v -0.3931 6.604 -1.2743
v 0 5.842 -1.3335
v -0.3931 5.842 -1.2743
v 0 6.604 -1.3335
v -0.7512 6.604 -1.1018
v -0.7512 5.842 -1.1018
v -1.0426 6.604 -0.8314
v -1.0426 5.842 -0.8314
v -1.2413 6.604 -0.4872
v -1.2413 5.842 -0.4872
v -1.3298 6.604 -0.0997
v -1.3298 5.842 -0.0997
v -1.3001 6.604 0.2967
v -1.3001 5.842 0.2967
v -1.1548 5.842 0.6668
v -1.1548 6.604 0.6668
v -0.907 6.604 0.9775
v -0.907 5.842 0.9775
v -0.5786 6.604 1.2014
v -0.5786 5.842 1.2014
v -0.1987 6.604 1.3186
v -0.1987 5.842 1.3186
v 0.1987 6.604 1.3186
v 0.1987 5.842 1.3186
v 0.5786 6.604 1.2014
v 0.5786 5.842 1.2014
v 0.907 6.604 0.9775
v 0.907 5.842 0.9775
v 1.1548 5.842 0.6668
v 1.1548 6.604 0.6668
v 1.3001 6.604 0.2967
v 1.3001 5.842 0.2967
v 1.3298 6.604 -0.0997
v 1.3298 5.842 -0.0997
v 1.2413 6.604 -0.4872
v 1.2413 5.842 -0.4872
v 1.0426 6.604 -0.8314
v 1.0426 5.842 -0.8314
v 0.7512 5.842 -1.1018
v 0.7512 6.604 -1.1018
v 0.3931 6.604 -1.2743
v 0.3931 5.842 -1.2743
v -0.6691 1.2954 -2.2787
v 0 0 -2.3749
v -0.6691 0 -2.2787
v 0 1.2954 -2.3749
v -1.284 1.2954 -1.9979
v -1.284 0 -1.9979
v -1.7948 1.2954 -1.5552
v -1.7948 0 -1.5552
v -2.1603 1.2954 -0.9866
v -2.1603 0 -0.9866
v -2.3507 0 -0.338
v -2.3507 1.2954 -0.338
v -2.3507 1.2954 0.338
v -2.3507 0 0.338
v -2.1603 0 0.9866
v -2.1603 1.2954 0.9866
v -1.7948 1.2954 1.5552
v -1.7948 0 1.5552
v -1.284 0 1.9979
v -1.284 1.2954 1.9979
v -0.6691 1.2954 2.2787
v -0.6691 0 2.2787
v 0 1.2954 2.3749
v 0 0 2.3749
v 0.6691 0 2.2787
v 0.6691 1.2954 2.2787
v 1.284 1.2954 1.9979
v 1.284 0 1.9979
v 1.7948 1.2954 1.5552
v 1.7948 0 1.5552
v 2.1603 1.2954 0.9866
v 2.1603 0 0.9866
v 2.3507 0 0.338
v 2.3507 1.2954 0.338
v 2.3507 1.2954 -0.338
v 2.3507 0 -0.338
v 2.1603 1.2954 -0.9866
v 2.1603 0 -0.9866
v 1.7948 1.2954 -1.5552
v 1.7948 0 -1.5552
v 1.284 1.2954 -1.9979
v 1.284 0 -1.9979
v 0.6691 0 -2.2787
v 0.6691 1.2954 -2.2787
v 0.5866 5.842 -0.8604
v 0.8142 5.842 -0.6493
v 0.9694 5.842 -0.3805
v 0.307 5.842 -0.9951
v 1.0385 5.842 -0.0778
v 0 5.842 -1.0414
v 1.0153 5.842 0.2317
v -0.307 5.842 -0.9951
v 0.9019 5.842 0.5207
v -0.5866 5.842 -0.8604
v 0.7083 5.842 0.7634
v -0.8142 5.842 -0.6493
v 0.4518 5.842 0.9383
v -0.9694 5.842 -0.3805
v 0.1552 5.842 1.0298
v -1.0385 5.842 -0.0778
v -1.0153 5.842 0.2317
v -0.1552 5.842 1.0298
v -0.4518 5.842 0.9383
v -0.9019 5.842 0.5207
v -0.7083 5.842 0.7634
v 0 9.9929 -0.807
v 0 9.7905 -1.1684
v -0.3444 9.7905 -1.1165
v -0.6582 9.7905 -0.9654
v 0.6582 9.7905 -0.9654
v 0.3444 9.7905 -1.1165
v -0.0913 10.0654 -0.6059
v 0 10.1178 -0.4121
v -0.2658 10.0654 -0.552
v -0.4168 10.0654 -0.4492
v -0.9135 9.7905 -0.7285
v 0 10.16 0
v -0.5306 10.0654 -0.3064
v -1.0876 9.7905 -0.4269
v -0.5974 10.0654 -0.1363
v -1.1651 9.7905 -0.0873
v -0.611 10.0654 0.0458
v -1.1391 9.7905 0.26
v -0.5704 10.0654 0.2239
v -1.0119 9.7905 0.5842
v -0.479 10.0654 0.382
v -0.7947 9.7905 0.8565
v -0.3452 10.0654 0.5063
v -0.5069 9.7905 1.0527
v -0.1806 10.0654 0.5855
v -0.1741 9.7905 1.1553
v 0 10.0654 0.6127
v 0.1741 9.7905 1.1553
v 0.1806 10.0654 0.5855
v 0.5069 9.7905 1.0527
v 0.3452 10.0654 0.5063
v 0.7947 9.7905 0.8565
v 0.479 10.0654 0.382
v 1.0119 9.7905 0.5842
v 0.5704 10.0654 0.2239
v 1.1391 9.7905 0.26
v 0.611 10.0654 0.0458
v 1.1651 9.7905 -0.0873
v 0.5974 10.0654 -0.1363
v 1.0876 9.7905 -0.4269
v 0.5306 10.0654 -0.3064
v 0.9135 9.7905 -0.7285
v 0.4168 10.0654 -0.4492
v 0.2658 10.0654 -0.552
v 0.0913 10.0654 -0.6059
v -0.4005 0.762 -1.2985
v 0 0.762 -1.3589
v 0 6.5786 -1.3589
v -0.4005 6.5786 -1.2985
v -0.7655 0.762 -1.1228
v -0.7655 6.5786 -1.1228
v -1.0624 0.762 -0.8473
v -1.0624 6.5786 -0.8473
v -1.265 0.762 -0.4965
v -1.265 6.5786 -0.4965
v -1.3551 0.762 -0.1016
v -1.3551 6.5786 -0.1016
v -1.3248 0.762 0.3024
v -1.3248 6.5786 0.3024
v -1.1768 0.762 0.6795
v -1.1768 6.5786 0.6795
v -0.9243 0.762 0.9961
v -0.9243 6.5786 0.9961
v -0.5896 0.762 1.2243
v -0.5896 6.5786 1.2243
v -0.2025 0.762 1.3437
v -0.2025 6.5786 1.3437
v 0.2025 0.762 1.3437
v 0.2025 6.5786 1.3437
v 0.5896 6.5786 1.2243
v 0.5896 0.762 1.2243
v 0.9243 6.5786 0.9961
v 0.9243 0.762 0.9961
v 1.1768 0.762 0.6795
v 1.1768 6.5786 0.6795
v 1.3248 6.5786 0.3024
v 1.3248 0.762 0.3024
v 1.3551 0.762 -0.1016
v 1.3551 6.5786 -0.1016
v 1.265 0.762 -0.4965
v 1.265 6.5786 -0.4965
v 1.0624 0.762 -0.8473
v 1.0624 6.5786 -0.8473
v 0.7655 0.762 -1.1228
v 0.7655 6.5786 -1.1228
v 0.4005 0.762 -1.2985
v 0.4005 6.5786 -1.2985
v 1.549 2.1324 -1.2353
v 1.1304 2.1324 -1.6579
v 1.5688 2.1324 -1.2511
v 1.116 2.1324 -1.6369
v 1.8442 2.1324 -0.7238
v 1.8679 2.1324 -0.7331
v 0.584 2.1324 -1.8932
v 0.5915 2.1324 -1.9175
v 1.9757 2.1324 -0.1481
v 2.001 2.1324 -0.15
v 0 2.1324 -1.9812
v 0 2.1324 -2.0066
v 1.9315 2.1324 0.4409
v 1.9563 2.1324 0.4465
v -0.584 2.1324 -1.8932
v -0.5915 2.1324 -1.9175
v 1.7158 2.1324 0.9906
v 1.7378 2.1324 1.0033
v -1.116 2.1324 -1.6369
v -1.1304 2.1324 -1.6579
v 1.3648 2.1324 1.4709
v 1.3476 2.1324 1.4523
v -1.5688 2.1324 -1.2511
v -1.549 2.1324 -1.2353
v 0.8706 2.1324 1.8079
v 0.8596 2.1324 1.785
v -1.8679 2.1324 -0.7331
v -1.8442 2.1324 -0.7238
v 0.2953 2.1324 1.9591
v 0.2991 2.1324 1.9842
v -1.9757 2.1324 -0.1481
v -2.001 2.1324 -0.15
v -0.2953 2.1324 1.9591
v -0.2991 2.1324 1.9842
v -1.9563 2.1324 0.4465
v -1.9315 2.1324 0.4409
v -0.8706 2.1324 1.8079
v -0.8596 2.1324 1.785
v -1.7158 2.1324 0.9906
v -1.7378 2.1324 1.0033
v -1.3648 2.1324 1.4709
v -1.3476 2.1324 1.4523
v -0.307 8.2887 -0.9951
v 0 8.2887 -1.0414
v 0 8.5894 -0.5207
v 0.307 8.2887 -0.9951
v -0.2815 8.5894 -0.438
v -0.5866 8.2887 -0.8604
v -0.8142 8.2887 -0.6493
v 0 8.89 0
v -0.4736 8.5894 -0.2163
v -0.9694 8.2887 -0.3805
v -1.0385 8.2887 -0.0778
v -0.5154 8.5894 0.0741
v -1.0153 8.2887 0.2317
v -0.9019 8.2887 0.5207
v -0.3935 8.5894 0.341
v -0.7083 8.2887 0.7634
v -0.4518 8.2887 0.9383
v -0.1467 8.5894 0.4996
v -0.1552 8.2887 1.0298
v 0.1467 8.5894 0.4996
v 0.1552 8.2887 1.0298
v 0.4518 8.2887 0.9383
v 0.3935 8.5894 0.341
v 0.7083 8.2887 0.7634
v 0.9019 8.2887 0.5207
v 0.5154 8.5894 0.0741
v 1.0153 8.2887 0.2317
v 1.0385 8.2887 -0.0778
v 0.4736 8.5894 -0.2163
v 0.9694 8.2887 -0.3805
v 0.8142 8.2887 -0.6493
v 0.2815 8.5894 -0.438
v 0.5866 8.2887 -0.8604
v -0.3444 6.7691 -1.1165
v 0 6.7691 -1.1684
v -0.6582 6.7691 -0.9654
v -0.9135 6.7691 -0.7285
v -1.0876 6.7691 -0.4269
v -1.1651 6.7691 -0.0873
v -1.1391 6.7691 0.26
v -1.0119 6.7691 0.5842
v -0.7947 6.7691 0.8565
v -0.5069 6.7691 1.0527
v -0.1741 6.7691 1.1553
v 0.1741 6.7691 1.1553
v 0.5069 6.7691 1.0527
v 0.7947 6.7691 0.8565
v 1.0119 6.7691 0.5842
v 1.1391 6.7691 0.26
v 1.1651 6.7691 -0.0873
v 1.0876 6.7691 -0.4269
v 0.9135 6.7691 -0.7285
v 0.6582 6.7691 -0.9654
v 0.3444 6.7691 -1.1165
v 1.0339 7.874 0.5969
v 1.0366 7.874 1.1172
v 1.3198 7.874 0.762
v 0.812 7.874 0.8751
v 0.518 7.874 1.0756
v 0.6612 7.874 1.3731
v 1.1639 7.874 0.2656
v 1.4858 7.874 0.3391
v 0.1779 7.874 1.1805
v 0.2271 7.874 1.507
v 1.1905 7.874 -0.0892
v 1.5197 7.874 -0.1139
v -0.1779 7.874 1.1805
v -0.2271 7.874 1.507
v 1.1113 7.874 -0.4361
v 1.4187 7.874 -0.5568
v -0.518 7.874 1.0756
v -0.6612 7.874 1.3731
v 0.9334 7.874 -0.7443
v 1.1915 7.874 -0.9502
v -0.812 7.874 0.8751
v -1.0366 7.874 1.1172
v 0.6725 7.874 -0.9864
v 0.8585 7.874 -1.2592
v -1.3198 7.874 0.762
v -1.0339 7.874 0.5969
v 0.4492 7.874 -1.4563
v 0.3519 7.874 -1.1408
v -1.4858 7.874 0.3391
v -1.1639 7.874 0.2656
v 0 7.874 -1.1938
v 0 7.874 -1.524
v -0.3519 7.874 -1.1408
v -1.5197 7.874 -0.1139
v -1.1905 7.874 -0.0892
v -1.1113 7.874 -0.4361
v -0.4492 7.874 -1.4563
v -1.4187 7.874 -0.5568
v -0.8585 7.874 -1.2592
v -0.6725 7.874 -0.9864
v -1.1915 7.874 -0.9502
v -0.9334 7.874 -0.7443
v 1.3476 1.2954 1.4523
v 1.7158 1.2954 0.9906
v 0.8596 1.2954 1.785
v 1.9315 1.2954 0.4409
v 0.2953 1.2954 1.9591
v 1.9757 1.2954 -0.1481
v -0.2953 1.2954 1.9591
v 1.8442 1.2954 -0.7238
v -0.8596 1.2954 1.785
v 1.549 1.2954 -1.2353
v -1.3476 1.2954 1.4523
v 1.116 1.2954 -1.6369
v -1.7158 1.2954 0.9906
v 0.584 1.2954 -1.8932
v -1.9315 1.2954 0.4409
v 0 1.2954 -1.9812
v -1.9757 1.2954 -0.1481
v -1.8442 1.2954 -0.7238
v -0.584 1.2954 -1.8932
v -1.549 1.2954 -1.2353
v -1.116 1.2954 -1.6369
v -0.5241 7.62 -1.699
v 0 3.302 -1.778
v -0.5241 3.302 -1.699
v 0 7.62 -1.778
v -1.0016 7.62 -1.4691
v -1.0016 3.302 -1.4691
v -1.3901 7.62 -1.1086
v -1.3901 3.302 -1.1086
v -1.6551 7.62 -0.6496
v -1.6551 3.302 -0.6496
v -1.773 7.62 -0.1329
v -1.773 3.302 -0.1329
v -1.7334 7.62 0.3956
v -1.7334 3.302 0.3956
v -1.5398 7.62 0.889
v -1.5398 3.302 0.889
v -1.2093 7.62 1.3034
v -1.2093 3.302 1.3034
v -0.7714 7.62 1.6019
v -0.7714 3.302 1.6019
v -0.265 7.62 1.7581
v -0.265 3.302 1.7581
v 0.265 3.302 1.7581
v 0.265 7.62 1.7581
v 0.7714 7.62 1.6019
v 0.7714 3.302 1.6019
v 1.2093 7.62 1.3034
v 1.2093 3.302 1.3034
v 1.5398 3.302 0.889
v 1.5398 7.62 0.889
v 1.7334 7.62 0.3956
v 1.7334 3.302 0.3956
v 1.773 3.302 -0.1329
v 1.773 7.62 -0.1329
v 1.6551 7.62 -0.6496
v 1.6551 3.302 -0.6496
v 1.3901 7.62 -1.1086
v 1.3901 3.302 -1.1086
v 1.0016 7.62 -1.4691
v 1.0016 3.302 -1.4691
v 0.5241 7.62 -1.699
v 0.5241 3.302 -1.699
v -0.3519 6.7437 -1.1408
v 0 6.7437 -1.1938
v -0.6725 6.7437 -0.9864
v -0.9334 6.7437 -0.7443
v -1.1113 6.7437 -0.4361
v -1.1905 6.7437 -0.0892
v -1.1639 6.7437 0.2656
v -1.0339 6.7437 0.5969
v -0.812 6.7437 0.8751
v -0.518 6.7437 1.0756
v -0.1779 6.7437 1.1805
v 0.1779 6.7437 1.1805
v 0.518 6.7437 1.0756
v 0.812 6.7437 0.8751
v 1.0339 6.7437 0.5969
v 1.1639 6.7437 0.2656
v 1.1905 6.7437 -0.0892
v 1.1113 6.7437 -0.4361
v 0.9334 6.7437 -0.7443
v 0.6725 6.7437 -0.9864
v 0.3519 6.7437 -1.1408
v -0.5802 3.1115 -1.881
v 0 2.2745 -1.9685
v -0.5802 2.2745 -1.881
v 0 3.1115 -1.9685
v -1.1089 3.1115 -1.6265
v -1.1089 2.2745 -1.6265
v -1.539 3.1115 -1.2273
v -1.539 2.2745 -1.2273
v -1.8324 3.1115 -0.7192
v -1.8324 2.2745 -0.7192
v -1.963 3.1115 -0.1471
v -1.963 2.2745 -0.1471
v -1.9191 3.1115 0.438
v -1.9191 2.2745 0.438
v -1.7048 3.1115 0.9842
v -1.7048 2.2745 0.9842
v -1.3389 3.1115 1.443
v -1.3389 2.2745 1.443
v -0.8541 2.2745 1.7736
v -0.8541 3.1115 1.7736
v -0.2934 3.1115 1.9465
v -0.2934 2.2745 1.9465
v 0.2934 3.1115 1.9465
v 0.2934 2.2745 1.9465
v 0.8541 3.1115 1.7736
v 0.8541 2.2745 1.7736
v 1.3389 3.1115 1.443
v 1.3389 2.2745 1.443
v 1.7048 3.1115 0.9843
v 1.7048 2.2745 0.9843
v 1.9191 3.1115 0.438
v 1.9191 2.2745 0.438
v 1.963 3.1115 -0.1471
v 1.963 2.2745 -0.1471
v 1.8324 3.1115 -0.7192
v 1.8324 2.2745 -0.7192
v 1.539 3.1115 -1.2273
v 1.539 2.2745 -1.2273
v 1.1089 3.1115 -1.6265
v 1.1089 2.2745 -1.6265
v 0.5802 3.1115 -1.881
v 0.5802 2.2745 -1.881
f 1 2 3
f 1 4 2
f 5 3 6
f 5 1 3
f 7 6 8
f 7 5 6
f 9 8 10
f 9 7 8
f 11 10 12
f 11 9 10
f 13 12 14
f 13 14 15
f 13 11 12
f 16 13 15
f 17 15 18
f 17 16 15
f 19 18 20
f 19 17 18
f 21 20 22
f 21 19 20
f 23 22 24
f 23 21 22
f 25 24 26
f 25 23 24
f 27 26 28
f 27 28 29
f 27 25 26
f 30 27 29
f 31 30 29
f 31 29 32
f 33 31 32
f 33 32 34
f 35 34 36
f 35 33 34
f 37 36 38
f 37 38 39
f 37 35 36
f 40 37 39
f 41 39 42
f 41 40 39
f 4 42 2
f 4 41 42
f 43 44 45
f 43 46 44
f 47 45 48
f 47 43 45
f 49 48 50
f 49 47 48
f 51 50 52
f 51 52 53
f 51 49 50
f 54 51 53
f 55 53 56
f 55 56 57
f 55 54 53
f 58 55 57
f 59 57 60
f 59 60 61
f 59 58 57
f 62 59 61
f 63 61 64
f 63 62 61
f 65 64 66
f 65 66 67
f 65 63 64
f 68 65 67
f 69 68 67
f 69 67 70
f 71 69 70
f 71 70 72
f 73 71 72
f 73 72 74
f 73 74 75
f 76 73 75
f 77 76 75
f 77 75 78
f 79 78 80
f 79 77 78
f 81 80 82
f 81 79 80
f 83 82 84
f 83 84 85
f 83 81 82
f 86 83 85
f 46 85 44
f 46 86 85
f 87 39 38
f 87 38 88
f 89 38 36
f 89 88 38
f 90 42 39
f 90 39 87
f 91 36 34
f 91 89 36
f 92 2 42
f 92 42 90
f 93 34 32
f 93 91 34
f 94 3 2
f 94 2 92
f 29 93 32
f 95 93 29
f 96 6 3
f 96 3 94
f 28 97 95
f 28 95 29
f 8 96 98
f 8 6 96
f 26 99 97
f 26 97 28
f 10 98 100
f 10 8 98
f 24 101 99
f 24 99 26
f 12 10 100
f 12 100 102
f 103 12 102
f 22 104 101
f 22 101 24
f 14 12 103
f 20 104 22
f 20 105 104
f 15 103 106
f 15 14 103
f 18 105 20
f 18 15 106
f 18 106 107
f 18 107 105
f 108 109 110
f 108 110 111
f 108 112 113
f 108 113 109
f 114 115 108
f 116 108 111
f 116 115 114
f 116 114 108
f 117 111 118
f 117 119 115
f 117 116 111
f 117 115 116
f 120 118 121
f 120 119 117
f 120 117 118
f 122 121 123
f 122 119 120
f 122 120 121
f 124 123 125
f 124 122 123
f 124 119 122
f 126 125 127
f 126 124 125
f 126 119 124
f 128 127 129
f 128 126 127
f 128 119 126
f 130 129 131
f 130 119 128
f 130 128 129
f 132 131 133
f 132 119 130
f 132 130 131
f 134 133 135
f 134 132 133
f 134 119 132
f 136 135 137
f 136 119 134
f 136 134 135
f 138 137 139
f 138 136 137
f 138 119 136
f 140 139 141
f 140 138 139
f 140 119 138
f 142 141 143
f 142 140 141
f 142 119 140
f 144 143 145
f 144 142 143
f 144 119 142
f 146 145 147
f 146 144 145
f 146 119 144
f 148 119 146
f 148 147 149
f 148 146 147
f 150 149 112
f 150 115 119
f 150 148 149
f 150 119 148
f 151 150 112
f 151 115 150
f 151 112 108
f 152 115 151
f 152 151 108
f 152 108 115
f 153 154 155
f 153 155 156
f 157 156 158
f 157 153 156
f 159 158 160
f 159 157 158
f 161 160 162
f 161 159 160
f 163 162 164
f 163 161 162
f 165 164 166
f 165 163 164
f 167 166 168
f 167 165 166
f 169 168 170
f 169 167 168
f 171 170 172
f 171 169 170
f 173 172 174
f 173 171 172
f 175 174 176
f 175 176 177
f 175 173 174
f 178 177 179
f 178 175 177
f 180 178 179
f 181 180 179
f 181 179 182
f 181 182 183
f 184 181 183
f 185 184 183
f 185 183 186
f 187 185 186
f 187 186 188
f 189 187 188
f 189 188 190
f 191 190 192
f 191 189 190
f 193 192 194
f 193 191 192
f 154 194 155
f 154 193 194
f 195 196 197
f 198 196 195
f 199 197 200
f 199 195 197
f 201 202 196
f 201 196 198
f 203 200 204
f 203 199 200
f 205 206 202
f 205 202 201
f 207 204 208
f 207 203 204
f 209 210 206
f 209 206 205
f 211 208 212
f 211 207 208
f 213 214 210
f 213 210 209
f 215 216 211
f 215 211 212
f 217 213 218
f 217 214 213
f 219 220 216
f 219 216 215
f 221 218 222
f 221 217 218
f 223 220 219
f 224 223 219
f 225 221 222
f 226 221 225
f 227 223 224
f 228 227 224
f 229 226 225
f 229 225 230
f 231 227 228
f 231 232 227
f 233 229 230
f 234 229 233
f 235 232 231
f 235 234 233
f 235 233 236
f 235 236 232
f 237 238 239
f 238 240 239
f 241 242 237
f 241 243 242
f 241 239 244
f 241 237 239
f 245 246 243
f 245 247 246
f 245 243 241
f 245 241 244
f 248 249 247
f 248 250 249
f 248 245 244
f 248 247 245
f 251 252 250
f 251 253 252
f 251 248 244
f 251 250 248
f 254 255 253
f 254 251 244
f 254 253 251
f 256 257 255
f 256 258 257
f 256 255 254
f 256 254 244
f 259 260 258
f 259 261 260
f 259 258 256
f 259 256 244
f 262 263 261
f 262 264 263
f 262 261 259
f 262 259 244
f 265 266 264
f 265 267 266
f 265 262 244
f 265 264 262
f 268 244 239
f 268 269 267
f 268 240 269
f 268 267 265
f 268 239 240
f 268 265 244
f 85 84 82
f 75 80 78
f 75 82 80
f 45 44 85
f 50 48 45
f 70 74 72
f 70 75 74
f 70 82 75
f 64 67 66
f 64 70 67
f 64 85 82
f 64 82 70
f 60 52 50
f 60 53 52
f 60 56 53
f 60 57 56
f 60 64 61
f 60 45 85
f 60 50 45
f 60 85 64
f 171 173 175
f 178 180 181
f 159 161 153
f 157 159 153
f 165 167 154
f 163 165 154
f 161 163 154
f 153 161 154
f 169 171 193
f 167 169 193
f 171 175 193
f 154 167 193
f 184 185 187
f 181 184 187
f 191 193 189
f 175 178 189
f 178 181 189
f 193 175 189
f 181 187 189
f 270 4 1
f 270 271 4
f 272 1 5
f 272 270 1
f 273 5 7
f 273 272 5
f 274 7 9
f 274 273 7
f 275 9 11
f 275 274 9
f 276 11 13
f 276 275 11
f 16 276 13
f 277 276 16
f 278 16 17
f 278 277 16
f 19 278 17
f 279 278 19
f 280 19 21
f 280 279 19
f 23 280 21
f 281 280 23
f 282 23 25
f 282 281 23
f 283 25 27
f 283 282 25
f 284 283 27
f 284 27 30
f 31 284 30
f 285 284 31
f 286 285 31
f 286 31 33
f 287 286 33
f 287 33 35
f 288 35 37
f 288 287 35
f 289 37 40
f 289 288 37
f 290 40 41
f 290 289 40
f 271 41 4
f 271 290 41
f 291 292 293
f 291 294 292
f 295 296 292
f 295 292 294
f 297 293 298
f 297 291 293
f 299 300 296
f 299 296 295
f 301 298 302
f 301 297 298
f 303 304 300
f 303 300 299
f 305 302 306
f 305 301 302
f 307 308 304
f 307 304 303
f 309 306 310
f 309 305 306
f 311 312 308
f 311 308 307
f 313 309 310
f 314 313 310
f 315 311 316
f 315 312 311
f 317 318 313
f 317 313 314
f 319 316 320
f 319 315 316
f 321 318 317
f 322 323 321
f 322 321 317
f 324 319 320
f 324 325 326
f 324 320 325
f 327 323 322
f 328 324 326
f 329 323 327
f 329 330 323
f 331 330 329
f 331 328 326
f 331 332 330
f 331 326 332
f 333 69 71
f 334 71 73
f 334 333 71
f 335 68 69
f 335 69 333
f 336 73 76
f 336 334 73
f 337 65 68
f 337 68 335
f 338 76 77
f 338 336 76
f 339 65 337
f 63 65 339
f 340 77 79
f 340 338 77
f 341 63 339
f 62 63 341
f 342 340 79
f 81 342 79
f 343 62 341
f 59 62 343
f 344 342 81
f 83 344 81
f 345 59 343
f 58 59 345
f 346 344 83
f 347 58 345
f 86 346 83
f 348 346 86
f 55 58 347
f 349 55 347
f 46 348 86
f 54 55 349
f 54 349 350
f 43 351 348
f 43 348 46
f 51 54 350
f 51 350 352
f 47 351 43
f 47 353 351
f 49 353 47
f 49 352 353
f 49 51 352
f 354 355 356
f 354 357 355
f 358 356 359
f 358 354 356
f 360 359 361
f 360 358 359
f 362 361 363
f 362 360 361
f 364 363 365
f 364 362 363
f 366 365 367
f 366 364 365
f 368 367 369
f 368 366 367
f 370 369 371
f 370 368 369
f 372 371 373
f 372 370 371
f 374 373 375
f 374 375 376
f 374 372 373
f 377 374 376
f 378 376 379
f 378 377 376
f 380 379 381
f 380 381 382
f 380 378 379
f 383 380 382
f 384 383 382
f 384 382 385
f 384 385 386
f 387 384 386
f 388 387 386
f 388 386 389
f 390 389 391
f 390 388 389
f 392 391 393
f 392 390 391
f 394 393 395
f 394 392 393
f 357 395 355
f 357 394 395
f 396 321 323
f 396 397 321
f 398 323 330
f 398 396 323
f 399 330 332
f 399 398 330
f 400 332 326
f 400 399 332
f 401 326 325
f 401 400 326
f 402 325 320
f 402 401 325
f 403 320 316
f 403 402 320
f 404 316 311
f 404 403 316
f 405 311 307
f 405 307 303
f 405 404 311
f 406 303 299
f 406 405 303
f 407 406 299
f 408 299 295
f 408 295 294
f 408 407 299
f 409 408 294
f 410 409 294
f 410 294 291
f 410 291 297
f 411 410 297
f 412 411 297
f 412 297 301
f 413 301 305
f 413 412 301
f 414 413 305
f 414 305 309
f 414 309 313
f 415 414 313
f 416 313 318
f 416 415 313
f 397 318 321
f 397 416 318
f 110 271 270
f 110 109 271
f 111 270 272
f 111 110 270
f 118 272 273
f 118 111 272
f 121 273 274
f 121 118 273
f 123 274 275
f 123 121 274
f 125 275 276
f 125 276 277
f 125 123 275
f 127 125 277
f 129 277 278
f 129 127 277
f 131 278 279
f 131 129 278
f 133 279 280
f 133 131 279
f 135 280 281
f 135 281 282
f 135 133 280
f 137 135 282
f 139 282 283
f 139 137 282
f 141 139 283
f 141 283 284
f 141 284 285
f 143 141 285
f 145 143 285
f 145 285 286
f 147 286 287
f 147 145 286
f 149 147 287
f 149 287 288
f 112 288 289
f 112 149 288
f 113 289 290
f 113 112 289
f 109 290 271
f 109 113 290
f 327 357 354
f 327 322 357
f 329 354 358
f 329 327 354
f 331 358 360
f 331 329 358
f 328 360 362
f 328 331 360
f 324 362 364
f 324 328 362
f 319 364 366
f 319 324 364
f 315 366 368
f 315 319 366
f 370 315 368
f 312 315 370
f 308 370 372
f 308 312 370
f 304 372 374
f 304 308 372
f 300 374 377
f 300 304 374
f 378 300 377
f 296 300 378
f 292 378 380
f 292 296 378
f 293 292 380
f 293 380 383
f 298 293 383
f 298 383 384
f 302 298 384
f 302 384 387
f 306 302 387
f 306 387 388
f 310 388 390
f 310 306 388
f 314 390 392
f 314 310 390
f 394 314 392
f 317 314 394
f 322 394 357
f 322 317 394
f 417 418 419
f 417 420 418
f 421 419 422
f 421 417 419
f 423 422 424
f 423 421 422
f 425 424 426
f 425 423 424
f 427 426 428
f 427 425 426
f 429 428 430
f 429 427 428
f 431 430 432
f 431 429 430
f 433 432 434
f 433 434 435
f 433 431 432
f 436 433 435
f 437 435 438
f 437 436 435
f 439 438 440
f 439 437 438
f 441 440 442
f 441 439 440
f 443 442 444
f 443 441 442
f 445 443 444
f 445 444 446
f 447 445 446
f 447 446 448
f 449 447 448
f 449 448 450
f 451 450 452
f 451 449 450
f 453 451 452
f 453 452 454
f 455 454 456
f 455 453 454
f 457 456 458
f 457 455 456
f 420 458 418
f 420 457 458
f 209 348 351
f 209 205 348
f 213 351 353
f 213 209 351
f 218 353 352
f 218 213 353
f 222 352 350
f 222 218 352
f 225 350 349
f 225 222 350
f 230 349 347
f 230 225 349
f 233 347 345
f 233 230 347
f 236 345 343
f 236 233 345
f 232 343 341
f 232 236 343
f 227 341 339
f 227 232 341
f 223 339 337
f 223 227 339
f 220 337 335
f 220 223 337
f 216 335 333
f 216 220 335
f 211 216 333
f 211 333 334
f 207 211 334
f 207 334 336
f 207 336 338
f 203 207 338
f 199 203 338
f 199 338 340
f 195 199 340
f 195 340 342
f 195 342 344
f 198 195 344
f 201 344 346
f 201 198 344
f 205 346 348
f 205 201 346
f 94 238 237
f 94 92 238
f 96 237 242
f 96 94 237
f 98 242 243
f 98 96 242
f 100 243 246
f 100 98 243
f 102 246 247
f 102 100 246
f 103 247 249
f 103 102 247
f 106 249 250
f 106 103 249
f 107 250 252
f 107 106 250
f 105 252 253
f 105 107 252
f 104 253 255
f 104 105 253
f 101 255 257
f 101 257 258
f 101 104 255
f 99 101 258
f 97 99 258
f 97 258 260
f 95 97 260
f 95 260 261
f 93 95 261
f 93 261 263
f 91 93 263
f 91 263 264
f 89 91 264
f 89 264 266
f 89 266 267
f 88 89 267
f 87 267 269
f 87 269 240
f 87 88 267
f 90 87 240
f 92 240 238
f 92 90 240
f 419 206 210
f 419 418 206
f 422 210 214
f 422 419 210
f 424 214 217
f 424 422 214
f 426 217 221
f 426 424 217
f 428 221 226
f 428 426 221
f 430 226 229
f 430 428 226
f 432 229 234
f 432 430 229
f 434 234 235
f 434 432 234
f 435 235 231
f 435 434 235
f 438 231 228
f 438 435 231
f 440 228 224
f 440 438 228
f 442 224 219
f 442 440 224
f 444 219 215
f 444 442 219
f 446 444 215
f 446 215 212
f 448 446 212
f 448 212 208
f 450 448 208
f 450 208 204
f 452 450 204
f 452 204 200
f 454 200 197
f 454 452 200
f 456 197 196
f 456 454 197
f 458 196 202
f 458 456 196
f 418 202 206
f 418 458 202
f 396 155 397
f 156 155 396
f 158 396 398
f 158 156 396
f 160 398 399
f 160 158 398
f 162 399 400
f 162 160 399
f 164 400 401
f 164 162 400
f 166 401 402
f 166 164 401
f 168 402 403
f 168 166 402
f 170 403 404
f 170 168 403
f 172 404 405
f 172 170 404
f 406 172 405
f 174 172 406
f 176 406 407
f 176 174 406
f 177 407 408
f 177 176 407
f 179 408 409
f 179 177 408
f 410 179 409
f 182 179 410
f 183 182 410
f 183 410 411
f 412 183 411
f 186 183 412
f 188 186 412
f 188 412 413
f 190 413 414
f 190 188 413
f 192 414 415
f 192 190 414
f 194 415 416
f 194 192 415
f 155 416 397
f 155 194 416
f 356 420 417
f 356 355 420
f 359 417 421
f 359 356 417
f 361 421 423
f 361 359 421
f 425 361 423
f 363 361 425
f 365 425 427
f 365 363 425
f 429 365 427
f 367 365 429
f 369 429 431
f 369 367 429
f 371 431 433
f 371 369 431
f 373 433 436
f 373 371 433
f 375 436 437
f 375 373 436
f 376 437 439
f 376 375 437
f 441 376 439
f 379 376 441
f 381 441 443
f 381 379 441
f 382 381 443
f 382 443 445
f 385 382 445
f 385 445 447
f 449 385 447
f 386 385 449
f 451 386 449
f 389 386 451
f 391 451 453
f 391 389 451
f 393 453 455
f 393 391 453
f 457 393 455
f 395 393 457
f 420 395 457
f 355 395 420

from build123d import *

# Parameters (mm, degrees)
BOSS_EXTRUDE1_START = -0.762
SKETCH4_R           = 2.3749
BOSS_EXTRUDE1_DEPTH = 0.762


with BuildPart() as part:
    # Sketch2 → Revolve1 (revolve)
    with BuildSketch(Plane.XY, mode=Mode.PRIVATE) as revolve1_sk:
        Polygon((-1.3589, 6.5786), (-1.3589, 0), (-2.3749, 0), (-2.3749, 1.2954), (-1.9812, 1.2954), (-1.9812, 2.132354432), (-2.0066, 2.132354432), (-1.9685, 2.274545568), (-1.9685, 3.1115), (-1.778, 3.302), (-1.778, 7.62), (-1.524, 7.874), (-1.1938, 7.874), (-1.1938, 6.7437), align=None)
    revolve(revolve1_sk.sketch.rotate(Axis((0, -1.383294113, 0), (0, 1, 0)), 270), axis=Axis((0, -1.383294113, 0), (0, 1, 0)))

    # Sketch4 → Boss-Extrude1 (add)
    with BuildSketch(Plane.XZ.offset(BOSS_EXTRUDE1_START)):
        with Locations(Location((0, 0, 0), (0, 0, 270))):
            Circle(SKETCH4_R)
    extrude(amount=BOSS_EXTRUDE1_DEPTH)


with BuildPart() as body_2:
    # Sketch3 → Revolve2 (revolve)
    with BuildSketch(Plane.XY, mode=Mode.PRIVATE) as revolve2_sk:
        with BuildLine():
            Line((-1.1684, 6.7691), (-1.1684, 9.790487726))
            ThreePointArc((-1.1684, 9.790487726), (-0.612718916, 10.065420845), (0, 10.16))
            Line((0, 10.16), (0, 8.89))
            Line((0, 8.89), (-1.0414, 8.28874743))
            Line((-1.0414, 8.28874743), (-1.0414, 5.842))
            Line((-1.0414, 5.842), (-1.3335, 5.842))
            Line((-1.3335, 5.842), (-1.3335, 6.604))
            Line((-1.3335, 6.604), (-1.1684, 6.7691))
        make_face()
    revolve(revolve2_sk.sketch.rotate(Axis((0, -1.383294113, 0), (0, 1, 0)), 270), axis=Axis((0, -1.383294113, 0), (0, 1, 0)))


solid = Compound([part.part, body_2.part])
